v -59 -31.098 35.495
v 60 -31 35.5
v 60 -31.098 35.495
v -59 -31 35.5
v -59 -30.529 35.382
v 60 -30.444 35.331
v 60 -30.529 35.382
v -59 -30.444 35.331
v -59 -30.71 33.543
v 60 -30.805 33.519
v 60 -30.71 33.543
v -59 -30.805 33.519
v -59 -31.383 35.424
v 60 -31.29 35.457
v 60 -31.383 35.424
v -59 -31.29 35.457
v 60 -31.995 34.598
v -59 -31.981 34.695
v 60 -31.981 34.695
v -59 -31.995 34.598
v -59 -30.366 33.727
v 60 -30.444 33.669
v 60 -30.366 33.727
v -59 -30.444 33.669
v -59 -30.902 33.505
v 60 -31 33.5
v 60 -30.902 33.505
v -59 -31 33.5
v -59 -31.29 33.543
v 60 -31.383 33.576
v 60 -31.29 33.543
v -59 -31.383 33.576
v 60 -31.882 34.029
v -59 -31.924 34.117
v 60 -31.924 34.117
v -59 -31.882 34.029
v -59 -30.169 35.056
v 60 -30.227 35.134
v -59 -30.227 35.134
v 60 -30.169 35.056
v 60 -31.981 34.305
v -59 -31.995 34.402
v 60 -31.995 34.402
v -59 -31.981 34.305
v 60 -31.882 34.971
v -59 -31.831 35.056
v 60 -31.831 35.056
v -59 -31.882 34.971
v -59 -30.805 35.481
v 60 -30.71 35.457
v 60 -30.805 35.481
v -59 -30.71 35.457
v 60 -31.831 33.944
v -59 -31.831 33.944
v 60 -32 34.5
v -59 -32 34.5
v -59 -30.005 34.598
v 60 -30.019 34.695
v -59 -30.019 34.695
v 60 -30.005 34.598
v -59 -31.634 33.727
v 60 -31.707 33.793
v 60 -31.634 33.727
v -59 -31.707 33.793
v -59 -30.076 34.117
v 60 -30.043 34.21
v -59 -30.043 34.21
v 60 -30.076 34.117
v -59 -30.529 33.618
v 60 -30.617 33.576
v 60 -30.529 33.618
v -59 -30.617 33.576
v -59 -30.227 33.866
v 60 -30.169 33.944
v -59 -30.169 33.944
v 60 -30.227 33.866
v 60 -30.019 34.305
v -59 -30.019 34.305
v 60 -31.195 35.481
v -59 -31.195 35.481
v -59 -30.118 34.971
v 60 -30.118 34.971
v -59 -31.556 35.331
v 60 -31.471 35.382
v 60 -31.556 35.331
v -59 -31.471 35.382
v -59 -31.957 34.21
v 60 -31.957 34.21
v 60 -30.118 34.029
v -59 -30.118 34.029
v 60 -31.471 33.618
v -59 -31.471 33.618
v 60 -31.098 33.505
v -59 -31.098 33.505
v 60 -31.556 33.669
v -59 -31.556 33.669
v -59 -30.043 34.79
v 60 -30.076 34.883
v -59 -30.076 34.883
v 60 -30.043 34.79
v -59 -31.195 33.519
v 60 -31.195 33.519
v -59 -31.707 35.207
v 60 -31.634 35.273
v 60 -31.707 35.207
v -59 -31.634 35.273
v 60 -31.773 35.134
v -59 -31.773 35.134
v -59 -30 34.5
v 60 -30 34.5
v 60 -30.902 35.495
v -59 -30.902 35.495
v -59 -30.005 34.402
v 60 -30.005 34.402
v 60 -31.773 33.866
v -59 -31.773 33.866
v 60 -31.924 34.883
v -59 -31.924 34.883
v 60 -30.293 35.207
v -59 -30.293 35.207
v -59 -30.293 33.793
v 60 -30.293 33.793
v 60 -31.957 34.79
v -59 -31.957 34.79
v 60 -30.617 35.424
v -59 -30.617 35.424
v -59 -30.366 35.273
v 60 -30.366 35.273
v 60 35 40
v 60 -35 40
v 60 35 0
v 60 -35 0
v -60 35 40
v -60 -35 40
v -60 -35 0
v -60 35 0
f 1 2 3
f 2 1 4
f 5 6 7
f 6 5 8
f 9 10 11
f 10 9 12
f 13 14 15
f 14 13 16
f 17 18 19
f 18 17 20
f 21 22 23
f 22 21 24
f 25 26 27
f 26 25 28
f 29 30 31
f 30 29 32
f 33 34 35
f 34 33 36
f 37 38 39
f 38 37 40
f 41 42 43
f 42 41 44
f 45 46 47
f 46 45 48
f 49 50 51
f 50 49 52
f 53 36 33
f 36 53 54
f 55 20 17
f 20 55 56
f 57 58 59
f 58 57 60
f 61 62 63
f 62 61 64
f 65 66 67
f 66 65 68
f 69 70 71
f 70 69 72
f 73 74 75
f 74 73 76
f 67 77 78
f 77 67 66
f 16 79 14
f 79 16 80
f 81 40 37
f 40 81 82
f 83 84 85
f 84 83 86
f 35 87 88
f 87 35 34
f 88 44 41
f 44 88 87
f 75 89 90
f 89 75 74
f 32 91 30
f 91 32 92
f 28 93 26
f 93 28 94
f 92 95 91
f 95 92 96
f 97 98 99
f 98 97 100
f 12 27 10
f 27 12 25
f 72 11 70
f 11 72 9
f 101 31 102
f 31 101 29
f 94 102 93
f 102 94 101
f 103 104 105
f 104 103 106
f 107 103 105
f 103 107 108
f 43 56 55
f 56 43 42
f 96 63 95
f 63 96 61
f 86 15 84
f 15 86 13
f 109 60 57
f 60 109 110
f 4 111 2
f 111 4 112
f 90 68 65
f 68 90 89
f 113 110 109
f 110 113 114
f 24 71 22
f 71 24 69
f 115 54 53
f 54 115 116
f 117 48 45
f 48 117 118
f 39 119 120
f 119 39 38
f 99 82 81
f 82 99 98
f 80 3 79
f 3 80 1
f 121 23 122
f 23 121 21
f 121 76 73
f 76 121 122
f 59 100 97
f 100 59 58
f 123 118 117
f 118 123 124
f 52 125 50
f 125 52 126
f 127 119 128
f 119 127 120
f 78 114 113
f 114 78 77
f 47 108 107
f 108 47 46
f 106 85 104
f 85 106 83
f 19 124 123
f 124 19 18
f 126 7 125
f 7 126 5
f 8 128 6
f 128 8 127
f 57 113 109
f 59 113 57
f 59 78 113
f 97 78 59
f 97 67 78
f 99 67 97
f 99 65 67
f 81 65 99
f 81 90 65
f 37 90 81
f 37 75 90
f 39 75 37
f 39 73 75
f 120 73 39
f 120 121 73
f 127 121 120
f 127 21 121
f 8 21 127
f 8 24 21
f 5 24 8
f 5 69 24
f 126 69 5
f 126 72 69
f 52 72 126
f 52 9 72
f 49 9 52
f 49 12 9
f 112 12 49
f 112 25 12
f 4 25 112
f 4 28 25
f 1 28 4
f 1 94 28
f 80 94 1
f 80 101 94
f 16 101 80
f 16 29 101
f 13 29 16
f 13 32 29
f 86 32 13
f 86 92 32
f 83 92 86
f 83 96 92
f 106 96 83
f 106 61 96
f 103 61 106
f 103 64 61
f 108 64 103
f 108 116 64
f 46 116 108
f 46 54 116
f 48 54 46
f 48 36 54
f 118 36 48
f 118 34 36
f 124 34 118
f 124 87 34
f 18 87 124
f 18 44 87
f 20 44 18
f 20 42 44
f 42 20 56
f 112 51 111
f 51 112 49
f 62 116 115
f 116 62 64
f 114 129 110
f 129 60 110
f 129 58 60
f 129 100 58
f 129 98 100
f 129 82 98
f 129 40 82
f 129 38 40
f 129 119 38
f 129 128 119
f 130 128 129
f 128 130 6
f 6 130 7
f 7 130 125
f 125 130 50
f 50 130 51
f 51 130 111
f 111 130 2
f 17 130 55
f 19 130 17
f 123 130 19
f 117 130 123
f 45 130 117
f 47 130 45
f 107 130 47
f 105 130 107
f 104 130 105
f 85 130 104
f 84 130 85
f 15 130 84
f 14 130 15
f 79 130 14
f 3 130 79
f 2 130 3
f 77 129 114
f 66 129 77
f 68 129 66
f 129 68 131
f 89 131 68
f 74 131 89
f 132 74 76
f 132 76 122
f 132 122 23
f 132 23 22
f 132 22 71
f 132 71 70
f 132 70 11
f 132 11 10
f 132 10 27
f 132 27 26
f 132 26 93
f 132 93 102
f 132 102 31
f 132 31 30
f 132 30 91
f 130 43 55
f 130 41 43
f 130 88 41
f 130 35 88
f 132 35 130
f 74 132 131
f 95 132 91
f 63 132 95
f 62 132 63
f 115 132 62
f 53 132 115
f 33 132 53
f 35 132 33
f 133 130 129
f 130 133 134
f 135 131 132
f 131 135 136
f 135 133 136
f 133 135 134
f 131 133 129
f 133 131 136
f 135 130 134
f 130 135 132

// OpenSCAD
// Mini horizontal gel-electrophoresis box - buffer tank
// Print orientation: tank rests on XY plane, open top facing +Z

// ---------- Parameters ----------
outer_x      = 120;   // outer length (X)
outer_y      = 70;    // outer width (Y)
outer_h      = 40;    // outer height (Z)
wall         = 3;     // wall thickness
floor        = 3;     // floor thickness
platform_x   = 60;    // platform length in X (centred)
platform_top = 13;    // platform top height above inner floor
hole_d       = 2;     // electrode hole diameter
eps          = 0.5;   // cutter overshoot past faces

$fn = 64;

// ---------- Derived ----------
inner_h   = outer_h - floor - wall;              // 34 mm
pitch     = outer_x / 2 - platform_x / 2;        // chamber length
y1        = -outer_y / 2 + wall + 1;             // left end wall Y
y2        = outer_y / 2 - wall - 1;              // right end wall Y

// ---------- Model ----------
difference() {
    // Tank body
    translate([-outer_x / 2, -outer_y / 2, 0])
        cube([outer_x, outer_y, outer_h]);

    // Raised central platform (solid, no cut through)
    translate([-platform_x / 2, -outer_y / 2, outer_h - floor - wall + platform_top])
        cube([platform_x, outer_y, floor + wall + eps]);

    // Horizontal electrode holes through end walls along X
    for (s = [-1, 1])
        translate([s * (outer_x / 2 - hole_d / 2), y1, outer_h - floor - wall + eps])
            rotate([0, 90, 0])
                cylinder(d = hole_d, h = outer_x + 2 * eps, $fn = 64);
}
